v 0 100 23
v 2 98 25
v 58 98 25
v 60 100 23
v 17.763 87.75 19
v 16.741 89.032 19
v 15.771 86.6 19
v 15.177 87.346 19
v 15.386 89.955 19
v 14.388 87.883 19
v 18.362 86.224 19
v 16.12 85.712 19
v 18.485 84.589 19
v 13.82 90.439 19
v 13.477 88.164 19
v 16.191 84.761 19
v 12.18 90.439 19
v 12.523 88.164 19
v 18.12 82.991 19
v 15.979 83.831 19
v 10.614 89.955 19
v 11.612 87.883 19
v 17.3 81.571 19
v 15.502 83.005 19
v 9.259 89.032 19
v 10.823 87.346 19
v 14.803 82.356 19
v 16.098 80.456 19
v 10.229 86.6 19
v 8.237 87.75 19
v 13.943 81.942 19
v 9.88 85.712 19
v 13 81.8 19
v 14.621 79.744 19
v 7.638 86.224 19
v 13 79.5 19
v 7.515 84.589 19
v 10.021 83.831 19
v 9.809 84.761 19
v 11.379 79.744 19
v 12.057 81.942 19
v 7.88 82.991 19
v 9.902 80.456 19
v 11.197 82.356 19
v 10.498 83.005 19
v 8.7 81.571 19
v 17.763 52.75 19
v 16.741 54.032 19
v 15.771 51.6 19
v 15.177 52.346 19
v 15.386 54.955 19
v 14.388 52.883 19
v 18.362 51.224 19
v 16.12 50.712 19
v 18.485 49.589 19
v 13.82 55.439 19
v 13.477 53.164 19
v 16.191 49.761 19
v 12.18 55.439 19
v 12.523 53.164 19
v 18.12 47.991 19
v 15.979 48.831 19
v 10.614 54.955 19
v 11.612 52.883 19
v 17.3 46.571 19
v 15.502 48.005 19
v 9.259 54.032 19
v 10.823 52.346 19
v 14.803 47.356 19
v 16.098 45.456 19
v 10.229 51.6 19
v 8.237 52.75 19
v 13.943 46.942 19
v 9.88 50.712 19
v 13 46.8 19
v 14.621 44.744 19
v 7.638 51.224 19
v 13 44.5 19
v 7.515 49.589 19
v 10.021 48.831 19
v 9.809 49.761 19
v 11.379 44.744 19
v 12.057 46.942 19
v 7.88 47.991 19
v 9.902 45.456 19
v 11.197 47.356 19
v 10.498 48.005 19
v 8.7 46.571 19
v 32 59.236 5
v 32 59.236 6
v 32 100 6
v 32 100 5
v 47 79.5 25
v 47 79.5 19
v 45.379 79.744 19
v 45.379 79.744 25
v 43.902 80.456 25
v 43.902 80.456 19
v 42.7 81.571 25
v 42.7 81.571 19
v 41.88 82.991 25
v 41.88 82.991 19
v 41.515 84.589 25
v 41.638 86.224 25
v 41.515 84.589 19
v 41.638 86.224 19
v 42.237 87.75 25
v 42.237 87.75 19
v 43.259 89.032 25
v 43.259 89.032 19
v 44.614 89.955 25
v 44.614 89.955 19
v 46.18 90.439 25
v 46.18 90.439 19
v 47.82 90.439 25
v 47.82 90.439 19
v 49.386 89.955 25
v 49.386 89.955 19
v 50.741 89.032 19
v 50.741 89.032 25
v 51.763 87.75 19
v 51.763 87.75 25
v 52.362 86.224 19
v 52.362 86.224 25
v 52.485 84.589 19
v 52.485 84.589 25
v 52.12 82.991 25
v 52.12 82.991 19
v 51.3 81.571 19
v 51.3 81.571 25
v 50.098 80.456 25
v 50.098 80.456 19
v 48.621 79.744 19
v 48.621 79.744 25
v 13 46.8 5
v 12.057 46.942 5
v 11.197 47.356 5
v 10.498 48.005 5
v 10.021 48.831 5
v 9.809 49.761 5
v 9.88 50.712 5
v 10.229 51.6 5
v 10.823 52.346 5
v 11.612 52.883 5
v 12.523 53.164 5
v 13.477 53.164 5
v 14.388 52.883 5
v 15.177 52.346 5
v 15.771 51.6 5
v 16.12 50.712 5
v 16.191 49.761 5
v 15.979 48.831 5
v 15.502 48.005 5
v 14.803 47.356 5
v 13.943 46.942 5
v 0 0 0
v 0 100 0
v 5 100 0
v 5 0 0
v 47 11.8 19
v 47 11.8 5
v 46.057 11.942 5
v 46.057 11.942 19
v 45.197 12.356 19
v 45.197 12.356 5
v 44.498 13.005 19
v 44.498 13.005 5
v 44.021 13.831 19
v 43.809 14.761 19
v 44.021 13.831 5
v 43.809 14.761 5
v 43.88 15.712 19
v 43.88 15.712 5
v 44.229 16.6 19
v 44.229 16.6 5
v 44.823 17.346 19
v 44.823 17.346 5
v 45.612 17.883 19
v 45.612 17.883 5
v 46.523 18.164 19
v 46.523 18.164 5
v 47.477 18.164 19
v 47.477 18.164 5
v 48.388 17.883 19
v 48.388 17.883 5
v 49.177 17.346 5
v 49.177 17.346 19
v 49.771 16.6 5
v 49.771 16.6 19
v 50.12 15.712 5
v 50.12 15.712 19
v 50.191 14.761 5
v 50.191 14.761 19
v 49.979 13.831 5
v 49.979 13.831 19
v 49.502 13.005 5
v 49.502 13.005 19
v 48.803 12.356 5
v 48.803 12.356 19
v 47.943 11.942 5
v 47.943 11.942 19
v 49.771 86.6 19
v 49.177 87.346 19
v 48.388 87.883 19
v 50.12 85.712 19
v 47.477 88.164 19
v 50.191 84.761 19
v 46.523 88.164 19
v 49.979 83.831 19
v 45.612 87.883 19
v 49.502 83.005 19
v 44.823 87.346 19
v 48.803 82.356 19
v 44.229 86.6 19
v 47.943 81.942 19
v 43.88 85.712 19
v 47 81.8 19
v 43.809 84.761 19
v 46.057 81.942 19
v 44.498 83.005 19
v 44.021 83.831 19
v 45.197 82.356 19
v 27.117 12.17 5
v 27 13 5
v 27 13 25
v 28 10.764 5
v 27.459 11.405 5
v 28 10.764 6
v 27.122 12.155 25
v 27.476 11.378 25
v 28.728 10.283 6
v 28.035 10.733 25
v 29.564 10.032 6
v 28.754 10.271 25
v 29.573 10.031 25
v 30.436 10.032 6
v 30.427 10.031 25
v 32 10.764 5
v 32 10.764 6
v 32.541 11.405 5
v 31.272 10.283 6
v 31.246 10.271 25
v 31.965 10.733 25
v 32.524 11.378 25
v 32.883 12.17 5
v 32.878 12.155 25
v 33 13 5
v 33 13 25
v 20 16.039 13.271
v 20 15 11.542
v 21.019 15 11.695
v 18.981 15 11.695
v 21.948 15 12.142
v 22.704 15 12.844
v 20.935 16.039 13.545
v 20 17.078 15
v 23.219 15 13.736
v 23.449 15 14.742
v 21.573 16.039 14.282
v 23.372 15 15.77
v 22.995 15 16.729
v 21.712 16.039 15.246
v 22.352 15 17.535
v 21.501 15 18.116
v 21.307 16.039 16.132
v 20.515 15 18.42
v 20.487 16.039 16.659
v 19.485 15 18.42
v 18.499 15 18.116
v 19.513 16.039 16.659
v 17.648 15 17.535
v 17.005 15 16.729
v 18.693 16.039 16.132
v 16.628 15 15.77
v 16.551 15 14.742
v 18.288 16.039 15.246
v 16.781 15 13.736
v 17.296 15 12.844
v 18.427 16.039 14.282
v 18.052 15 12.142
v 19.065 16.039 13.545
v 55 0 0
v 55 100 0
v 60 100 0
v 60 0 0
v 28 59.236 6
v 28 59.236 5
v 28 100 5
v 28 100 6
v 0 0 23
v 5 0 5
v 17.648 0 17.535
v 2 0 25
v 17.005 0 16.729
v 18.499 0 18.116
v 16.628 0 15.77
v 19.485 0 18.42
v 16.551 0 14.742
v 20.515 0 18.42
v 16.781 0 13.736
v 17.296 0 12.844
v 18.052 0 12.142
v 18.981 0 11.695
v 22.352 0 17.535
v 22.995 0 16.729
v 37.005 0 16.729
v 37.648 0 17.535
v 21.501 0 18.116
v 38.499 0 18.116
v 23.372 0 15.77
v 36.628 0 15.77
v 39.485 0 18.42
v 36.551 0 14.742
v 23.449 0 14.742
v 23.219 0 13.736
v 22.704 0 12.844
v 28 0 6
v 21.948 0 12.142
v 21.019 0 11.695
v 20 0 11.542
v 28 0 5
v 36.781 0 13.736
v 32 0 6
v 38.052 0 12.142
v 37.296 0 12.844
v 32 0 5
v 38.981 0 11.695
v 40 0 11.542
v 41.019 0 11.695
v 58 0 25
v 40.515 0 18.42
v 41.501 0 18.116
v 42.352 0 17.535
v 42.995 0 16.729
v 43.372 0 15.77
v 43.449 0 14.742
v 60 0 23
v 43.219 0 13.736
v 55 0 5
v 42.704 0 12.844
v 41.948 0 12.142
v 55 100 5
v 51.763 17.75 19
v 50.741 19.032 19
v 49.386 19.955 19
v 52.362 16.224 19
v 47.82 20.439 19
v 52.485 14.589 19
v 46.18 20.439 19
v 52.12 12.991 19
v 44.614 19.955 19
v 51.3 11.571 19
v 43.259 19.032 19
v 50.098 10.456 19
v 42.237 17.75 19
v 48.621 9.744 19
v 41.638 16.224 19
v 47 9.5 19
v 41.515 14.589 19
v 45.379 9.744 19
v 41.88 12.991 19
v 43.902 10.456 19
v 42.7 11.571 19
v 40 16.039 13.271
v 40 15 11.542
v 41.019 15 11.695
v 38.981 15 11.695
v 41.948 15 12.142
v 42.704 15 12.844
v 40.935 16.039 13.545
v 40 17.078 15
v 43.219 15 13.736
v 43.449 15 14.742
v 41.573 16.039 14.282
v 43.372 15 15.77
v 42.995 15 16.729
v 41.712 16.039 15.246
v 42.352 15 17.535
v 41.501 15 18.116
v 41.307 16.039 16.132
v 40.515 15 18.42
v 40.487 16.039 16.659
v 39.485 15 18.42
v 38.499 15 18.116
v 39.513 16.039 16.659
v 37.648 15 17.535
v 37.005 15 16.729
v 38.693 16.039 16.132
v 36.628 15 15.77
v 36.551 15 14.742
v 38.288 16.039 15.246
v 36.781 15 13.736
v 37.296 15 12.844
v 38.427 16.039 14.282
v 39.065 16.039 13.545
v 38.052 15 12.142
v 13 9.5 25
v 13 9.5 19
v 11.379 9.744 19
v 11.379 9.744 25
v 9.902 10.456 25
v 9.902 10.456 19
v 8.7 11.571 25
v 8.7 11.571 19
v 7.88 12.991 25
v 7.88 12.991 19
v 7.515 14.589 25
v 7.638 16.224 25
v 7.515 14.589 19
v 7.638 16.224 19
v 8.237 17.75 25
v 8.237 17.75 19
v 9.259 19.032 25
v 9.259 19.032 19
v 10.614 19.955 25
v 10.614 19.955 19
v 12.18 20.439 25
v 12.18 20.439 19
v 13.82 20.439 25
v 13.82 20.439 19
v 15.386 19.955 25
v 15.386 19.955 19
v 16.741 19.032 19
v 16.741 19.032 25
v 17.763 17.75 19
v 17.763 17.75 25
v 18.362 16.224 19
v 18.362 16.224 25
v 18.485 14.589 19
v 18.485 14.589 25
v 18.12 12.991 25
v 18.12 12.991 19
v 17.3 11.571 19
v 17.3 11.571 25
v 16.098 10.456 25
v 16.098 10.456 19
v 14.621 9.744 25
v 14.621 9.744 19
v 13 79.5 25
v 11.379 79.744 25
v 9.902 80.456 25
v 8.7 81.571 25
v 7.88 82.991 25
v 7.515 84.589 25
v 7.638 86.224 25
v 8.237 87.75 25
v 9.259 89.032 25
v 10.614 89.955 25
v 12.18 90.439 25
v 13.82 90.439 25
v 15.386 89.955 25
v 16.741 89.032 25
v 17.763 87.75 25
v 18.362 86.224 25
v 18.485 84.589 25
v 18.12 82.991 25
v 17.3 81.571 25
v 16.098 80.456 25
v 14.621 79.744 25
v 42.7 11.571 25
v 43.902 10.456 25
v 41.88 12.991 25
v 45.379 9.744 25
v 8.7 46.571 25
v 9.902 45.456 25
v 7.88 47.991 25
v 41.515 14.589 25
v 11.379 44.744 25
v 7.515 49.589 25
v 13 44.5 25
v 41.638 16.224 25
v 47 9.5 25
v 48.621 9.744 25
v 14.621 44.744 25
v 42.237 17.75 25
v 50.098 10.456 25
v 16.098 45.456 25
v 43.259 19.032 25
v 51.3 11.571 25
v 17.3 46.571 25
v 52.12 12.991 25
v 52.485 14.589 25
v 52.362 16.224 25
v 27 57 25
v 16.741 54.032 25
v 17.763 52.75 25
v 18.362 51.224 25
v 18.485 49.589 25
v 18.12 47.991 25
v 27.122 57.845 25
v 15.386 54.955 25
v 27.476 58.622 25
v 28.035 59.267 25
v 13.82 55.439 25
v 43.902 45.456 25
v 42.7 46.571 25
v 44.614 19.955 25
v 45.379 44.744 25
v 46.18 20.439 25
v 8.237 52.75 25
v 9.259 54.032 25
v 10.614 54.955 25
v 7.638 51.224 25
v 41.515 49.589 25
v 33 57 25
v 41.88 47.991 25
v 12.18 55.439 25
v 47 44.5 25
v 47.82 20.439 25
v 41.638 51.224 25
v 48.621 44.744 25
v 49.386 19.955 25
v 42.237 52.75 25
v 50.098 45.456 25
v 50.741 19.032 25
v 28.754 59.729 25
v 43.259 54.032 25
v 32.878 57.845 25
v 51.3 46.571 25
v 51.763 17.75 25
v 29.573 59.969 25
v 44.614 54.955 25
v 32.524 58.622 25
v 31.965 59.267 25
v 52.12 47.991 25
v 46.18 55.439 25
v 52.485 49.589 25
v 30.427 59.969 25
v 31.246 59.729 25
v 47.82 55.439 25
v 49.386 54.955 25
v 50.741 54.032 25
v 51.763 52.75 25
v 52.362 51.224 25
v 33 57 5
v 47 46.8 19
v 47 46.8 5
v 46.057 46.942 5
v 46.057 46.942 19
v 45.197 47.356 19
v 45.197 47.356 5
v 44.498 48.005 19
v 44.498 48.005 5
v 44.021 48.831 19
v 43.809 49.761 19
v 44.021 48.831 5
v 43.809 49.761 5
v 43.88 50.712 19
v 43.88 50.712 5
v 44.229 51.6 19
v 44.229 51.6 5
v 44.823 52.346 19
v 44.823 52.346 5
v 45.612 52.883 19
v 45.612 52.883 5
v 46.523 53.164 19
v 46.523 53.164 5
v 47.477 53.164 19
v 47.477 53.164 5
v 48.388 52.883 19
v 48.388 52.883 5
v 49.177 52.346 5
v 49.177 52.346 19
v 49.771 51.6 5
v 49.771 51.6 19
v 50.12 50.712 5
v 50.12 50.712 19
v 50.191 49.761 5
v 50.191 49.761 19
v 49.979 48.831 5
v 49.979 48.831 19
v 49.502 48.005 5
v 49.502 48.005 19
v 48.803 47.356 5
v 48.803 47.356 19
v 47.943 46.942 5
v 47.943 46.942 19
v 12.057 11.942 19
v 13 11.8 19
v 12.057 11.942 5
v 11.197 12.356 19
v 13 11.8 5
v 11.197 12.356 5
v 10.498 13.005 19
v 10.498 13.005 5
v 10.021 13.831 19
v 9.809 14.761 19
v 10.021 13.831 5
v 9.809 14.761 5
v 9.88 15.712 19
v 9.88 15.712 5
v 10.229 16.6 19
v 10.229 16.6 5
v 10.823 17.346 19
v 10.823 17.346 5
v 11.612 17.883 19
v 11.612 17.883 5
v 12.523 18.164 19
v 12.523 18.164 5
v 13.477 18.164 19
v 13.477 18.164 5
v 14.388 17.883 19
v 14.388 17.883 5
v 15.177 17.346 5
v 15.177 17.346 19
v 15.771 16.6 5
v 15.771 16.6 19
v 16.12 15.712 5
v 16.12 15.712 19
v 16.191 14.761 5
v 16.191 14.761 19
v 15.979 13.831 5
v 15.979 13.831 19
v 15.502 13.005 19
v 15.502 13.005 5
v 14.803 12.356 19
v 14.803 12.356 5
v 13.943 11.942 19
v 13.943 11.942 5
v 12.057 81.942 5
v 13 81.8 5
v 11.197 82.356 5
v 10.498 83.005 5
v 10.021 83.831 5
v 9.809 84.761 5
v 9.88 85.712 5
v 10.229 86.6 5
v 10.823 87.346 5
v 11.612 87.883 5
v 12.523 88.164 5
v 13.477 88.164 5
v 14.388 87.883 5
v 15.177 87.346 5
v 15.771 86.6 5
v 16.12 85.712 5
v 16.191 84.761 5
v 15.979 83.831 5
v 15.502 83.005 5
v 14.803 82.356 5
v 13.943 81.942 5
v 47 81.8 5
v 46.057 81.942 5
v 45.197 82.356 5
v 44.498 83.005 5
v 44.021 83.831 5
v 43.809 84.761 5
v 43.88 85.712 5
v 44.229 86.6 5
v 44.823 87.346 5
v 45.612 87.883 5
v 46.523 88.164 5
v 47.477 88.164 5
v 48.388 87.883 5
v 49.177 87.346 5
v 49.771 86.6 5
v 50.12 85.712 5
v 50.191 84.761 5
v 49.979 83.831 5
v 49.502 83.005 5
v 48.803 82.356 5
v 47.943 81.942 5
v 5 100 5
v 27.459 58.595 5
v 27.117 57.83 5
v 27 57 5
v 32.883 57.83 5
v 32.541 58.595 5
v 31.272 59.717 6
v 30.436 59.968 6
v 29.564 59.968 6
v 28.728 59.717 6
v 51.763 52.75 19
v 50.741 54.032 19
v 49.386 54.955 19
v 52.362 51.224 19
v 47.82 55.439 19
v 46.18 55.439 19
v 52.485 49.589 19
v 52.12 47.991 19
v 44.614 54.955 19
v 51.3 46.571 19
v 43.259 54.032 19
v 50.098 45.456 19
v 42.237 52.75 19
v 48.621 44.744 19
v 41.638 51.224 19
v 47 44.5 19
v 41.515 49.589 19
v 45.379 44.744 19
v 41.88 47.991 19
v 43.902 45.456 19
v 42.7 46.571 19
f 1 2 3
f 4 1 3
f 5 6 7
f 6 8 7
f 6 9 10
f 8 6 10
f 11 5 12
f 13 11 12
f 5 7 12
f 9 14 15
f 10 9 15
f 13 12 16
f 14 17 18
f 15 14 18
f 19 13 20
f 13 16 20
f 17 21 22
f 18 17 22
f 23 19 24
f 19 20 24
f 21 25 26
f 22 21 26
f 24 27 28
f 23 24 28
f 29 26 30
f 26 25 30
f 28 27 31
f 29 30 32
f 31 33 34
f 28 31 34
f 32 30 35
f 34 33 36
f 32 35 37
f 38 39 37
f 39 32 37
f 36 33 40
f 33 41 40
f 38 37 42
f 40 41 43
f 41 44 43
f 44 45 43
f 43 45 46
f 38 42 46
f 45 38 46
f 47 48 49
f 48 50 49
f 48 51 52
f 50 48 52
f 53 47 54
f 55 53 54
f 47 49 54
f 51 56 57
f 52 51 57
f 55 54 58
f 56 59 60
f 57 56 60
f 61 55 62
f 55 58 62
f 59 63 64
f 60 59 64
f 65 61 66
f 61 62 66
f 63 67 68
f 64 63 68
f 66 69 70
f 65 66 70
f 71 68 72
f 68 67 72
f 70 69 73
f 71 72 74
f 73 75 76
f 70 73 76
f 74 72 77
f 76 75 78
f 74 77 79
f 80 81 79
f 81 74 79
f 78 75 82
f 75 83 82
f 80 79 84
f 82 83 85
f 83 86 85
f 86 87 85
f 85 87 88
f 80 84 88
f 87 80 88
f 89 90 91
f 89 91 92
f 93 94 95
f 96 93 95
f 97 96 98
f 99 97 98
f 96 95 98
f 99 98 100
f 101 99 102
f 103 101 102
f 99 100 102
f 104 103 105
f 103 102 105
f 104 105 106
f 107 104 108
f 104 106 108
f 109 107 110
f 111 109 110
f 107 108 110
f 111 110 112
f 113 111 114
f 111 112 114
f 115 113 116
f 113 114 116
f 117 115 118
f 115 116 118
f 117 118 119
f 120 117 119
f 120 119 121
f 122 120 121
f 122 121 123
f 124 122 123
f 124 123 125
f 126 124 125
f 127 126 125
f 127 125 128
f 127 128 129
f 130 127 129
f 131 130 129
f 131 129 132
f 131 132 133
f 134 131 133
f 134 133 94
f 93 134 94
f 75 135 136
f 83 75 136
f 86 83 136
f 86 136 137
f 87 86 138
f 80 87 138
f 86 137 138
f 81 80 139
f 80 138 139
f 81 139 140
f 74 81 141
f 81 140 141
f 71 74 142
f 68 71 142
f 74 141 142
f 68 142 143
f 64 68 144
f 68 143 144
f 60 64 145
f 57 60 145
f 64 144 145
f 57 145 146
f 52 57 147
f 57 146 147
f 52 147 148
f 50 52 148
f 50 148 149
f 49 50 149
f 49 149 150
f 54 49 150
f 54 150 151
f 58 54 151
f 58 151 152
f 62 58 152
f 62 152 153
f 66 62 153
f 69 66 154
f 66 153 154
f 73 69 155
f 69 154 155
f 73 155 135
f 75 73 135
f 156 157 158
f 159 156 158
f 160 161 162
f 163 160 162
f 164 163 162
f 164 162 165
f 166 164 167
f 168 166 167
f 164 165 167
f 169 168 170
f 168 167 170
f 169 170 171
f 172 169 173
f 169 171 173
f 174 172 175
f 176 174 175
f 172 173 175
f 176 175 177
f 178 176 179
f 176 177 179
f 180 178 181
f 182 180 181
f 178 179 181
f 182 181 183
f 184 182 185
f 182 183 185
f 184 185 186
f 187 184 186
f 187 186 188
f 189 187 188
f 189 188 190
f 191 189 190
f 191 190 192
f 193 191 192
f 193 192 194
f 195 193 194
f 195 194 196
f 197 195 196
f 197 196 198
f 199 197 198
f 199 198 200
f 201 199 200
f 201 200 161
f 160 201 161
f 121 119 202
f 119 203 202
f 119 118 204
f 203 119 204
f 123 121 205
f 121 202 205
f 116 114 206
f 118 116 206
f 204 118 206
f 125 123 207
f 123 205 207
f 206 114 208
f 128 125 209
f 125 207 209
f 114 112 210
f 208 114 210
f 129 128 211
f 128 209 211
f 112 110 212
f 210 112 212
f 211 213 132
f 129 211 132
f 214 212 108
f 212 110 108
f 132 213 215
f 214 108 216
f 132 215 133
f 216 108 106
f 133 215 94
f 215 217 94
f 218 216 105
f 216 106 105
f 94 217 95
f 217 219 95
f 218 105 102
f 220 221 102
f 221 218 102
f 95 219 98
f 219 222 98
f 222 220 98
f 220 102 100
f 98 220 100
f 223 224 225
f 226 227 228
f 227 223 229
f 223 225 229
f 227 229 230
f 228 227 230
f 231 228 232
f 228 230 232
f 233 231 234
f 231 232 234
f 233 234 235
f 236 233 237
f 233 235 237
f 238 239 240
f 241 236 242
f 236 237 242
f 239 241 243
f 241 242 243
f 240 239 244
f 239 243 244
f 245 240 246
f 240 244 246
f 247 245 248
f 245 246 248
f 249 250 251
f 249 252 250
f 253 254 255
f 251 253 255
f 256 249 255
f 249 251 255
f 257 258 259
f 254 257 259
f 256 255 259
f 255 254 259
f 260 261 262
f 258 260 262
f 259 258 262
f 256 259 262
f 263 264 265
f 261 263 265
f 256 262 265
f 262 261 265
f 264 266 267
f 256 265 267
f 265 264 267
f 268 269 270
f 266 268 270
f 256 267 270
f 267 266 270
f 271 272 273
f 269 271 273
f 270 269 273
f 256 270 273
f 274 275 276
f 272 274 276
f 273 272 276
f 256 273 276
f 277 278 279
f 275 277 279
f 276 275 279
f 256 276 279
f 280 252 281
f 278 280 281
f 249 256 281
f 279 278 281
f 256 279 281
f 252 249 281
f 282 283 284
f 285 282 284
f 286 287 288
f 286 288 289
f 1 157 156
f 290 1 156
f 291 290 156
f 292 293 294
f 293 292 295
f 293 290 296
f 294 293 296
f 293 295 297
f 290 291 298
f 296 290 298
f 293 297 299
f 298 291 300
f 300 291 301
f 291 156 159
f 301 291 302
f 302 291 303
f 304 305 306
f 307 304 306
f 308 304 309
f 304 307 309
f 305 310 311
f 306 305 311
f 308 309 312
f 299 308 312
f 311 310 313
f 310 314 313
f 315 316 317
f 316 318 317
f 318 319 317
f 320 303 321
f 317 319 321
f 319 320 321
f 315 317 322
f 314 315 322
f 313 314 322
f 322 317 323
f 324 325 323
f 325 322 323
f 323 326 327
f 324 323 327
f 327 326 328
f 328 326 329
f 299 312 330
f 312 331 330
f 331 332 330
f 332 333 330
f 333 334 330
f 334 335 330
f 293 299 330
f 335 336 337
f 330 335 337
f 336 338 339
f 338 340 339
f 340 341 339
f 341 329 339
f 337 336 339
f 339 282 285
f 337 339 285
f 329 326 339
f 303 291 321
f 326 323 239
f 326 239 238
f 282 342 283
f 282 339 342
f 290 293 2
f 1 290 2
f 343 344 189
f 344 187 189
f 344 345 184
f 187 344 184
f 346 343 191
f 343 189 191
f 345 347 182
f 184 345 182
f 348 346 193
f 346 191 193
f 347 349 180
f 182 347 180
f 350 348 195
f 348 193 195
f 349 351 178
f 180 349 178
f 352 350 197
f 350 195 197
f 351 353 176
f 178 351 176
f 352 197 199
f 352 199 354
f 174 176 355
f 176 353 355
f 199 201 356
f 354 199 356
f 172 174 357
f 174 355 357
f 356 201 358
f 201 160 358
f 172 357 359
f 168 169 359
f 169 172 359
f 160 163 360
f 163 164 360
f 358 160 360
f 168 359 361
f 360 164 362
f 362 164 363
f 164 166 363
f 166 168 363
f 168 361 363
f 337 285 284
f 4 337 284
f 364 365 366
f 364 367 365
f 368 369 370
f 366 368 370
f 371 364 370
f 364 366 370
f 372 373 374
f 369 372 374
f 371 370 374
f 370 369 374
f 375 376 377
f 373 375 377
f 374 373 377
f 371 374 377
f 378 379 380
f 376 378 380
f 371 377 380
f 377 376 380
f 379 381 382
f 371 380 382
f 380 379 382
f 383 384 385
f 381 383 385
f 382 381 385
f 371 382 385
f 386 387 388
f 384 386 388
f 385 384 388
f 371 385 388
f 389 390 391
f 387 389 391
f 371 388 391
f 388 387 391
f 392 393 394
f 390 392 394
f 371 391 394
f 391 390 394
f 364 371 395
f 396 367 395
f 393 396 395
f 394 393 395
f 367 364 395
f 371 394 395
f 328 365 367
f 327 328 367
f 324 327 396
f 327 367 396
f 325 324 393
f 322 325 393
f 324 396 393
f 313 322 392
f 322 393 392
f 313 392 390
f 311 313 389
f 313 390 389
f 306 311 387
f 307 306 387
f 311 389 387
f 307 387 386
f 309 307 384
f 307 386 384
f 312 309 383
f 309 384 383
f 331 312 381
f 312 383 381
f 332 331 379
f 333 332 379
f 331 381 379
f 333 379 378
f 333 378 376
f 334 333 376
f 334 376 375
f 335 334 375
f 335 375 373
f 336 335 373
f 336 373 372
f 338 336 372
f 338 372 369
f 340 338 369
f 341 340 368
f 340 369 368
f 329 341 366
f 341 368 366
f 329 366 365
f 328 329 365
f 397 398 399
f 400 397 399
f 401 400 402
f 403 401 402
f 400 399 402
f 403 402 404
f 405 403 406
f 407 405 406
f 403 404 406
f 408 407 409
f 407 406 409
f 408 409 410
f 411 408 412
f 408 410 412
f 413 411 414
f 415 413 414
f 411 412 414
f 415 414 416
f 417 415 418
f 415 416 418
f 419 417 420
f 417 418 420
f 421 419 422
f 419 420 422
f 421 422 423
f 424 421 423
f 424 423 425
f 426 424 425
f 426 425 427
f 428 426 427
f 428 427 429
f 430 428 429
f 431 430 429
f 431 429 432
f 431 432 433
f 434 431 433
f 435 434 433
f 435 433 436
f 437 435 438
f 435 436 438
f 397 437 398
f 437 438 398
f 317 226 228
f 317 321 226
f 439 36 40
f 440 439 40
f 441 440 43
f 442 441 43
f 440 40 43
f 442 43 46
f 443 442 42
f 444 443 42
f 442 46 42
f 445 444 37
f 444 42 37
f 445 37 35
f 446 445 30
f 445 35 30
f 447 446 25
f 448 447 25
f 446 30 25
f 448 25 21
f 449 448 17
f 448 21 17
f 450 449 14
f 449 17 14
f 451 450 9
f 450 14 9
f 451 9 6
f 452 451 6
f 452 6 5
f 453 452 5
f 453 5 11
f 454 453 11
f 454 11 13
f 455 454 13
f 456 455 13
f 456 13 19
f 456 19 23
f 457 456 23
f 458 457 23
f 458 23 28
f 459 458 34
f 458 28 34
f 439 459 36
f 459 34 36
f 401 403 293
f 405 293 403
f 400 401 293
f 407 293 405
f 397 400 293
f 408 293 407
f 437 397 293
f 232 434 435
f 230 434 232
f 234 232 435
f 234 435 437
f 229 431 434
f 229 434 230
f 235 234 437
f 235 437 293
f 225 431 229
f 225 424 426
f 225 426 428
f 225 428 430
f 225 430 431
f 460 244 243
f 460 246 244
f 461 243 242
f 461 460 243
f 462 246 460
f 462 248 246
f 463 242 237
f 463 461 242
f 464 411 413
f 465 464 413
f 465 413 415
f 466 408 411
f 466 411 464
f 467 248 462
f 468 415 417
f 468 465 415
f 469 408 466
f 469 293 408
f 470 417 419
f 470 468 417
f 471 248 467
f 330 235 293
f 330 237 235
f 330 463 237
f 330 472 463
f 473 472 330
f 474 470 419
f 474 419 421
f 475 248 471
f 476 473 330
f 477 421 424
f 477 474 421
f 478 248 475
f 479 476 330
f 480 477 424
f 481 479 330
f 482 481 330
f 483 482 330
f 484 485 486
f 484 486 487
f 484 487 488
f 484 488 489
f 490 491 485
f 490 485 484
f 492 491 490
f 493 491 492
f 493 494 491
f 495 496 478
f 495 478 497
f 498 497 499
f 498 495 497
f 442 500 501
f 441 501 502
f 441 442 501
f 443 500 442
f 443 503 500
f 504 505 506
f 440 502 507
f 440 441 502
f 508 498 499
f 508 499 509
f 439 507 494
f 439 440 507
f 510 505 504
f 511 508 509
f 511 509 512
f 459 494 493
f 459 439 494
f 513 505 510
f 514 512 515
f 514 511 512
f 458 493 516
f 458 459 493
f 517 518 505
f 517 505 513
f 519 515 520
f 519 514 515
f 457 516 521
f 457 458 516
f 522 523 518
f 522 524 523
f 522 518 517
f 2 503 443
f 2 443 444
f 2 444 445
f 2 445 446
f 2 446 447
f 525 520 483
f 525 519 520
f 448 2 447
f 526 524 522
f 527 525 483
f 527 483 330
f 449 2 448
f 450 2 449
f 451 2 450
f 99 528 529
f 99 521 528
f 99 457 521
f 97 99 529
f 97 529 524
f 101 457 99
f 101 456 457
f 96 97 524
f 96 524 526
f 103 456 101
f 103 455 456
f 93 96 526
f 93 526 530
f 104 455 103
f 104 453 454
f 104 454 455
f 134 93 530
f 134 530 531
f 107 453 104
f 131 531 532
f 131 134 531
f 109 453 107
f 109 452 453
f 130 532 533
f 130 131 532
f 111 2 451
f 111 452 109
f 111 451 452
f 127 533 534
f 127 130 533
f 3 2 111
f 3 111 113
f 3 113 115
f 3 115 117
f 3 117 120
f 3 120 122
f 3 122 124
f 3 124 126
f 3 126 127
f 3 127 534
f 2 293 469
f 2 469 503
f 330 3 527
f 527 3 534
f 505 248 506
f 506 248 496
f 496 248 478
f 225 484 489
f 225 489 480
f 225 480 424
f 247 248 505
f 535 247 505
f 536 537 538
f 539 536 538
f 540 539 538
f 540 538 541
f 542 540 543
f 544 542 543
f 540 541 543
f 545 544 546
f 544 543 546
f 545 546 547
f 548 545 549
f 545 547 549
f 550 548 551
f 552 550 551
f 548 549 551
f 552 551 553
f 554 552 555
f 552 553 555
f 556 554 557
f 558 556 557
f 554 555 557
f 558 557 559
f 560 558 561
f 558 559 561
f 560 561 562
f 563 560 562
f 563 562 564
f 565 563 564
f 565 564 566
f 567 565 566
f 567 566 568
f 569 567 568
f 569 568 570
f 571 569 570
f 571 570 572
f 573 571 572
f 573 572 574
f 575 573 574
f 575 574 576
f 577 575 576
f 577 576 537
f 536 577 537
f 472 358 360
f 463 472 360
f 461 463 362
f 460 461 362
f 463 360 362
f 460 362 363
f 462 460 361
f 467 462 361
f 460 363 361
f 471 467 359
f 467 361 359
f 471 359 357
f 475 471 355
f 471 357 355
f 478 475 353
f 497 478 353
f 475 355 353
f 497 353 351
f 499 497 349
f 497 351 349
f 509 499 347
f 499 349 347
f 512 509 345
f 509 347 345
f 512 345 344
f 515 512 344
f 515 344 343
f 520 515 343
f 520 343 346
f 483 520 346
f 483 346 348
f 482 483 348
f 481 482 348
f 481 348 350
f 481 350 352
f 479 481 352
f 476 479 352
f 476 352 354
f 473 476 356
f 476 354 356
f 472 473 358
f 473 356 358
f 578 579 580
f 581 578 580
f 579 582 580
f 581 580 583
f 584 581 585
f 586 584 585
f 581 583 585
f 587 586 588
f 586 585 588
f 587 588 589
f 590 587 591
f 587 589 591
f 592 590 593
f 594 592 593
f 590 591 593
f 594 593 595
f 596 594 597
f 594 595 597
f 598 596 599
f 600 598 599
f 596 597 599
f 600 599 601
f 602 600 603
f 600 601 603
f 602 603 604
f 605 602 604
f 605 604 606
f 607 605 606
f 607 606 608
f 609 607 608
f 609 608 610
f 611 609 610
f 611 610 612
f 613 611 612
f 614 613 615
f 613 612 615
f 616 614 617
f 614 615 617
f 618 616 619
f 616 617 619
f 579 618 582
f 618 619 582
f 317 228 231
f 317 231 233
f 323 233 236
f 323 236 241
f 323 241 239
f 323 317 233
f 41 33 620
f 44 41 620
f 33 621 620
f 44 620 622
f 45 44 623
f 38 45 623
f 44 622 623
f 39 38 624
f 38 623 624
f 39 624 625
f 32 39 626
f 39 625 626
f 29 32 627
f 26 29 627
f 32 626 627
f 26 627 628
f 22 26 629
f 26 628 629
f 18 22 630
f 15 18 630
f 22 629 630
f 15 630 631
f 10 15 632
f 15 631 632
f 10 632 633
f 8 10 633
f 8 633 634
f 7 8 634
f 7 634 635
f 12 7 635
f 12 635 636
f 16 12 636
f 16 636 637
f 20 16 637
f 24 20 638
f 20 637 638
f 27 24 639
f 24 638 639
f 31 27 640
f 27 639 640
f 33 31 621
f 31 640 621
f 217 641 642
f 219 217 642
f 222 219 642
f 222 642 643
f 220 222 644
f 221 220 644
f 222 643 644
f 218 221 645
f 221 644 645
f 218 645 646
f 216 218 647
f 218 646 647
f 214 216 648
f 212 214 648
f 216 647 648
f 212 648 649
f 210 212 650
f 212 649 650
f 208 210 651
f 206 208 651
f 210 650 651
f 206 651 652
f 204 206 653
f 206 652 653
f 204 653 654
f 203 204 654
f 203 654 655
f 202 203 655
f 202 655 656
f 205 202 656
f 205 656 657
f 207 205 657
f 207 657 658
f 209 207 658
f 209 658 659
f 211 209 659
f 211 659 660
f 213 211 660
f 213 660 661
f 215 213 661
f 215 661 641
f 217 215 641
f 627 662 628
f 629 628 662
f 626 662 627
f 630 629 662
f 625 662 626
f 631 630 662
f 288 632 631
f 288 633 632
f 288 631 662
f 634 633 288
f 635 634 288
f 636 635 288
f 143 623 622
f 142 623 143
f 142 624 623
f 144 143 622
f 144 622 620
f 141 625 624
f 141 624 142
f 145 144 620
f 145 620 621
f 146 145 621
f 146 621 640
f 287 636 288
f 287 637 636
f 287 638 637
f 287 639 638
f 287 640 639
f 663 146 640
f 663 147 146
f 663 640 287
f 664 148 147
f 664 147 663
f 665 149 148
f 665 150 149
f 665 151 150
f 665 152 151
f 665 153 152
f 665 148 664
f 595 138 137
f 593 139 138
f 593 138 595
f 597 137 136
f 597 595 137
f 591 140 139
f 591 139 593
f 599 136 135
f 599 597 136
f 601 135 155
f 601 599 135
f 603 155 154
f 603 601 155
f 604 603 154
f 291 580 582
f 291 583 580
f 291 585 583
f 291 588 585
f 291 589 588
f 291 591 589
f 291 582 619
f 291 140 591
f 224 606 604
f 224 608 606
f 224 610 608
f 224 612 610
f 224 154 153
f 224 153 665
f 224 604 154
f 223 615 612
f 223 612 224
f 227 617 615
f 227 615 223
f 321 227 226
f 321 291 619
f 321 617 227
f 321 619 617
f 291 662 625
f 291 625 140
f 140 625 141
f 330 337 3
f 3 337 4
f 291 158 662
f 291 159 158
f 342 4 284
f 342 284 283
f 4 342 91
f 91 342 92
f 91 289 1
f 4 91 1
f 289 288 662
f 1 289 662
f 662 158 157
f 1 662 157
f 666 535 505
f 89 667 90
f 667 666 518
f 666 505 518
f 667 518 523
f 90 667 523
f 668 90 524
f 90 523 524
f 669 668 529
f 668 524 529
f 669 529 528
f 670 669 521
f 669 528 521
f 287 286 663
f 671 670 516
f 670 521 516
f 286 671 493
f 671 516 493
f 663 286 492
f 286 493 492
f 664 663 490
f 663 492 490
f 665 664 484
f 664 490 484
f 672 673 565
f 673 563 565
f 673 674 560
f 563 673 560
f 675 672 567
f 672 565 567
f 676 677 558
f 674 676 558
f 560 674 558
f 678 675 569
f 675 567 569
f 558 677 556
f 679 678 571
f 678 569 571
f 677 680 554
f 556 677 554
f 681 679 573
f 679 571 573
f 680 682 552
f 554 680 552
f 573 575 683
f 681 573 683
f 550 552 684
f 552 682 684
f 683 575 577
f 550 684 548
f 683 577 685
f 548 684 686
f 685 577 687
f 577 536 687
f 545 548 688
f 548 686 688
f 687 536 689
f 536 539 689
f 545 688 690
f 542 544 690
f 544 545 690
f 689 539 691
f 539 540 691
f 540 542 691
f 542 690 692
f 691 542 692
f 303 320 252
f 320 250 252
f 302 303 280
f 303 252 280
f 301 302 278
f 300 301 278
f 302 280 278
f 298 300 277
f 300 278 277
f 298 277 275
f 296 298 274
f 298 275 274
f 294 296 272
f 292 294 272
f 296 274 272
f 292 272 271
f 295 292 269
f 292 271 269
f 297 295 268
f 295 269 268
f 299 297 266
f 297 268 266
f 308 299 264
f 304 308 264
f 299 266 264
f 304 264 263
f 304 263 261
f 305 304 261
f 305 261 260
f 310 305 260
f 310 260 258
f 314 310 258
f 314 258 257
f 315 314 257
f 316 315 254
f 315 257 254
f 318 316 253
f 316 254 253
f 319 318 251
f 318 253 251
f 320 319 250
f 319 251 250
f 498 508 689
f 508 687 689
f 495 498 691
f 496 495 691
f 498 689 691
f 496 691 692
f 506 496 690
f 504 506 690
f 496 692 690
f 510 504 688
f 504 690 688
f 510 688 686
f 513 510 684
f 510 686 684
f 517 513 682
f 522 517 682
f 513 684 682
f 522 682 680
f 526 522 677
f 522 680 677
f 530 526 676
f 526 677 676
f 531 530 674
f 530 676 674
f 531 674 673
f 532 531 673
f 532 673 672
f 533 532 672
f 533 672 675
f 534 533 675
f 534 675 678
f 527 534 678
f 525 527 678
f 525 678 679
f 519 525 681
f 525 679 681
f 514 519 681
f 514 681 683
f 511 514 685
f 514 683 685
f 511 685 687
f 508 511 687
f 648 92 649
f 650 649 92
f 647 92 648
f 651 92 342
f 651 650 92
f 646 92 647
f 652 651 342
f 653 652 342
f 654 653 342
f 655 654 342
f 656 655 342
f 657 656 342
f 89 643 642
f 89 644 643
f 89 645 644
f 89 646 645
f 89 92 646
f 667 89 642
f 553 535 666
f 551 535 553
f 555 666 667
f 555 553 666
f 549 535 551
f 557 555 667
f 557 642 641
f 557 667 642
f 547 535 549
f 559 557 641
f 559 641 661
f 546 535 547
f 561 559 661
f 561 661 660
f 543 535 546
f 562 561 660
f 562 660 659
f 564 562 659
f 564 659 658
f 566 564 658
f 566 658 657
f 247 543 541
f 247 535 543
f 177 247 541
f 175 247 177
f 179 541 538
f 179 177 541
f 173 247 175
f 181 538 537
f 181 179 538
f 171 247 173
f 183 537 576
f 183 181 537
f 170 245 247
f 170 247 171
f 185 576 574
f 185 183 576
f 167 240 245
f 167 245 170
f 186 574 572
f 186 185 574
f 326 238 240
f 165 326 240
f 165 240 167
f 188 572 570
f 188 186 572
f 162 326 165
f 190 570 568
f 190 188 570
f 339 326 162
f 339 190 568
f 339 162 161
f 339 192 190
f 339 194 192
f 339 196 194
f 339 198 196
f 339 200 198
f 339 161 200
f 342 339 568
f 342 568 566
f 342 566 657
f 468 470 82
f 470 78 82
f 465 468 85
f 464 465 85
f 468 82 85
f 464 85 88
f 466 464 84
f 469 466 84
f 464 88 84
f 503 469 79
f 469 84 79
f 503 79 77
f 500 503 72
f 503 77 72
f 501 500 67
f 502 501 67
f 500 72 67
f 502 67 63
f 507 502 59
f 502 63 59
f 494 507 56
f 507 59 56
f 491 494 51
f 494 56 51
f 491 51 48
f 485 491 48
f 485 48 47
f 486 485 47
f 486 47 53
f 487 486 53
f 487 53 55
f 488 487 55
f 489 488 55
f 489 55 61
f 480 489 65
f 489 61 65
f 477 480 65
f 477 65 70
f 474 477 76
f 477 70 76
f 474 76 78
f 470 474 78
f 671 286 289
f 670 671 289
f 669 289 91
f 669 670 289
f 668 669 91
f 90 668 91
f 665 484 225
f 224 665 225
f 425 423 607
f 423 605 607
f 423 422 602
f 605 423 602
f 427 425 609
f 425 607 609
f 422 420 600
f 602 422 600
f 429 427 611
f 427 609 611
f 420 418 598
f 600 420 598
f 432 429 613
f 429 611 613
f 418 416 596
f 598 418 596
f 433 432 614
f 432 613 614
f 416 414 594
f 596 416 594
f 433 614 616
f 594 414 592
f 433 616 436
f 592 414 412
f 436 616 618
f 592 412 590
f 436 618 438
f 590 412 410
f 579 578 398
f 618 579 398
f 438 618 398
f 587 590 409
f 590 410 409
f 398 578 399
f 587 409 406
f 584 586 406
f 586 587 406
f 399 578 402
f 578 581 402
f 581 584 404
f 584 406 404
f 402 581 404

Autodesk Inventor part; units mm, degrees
ref_plane "YZ Plane" through (0, 0, 0) normal (1, 0, 0) x (0, 1, 0)
ref_plane "XZ Plane" through (0, 0, 0) normal (0, 1, 0) x (-1, 0, 0)
ref_plane "XY Plane" through (0, 0, 0) normal (0, 0, 1) x (1, 0, 0)
sketch "Sketch3" plane through (0, 0, 0) normal (0, 0, 1) x (1, 0, 0)
  line L0 (0, 0) -> (60, 0)
  line L1 (60, 0) -> (60, 100)
  line L2 (60, 100) -> (0, 100)
  line L3 (0, 100) -> (0, 0)
  dimension "d6" = 60
  dimension "d7" = 100
extrude "Extrusion1" add sketch "Sketch3" along normal blind 25
sketch "Sketch4" plane through (0, 0, 0) normal (0, -1, 0) x (1, 0, 0)
  line L0 (60, 0) -> (0, 0) projected
  line L1 (5, 0) -> (5, 5)
  line L2 (5, 5) -> (28, 5)
  line L3 (28, 5) -> (28, 6)
  line L4 (28, 6) -> (32, 6)
  line L5 (32, 6) -> (32, 5)
  line L6 (32, 5) -> (55, 5)
  line L7 (55, 5) -> (55, 0)
  line L8 (55, 0) -> (5, 0)
  line L9 (0, 0) -> (0, 25) projected
  dimension "d14" = 5
  dimension "d15" = 23
  dimension "d16" = 1
  dimension "d17" = 4
  dimension "d18" = 1
  dimension "d19" = 23
  dimension "d20" = 5
  dimension "d21" = 5
extrude "Extrusion2" cut sketch "Sketch4" against normal through all
sketch "Sketch5" plane through (0, 0, 25) normal (0, 0, 1) x (1, 0, 0)
  line L0 (0, 0) -> (60, 0) projected
  line L1 (0, 100) -> (0, 0) projected
  point P0 (47, 15)
  point P1 (47, 50)
  point P2 (47, 85)
  point P3 (13, 15)
  point P4 (13, 50)
  point P5 (13, 85)
  dimension "d24" = 15
  dimension "d25" = 47
  dimension "d28" = 35
  dimension "d31" = 34
hole "Hole1" at (47, 15, 25) at (47, 50, 25) at (47, 85, 25) at (13, 15, 25) at (13, 50, 25) at (13, 85, 25) direction (0, 0, -1) diameter 6.4 end through all counterbore diameter 11 counterbore depth 6
sketch "Sketch6" plane through (0, 0, 25) normal (0, -1, 0) x (1, 0, 0)
  line L0 (0, 0) -> (60, 0) projected
  line L1 (0, -25) -> (0, 0) projected
  point P0 (20, -10)
  point P1 (40, -10)
  dimension "d41" = 10
  dimension "d42" = 10
  dimension "d43" = 20
  dimension "d44" = 20
hole "Hole2" at (20, 0, 15) at (40, 0, 15) direction (0, 1, 0) diameter 6.917 depth 15 tip angle 118 thread size "M8x1" class "6H" standard "ISO Metric profile"
sketch "Sketch7" plane through (0, 0, 25) normal (0, 0, 1) x (1, 0, 0)
  line L0 (30, 13) -> (30, 57) construction
  line L1 (33, 13) -> (33, 57)
  line L2 (27, 57) -> (27, 13)
  arc A0 (27, 13) -> (33, 13) centre (30, 13) ccw
  arc A1 (33, 57) -> (27, 57) centre (30, 57) ccw
  line L3 (0, 0) -> (60, 0) projected
  point P0 (30, 35)
  dimension "d52" = 44
  dimension "d53" = 6
  dimension "d54" = 30
  dimension "d55" = 13
extrude "Extrusion3" cut sketch "Sketch7" against normal through all
chamfer "Chamfer2" distance 2 angle 45 3 edges at (0, 50, 25) (30, 100, 25) (60, 50, 25)
